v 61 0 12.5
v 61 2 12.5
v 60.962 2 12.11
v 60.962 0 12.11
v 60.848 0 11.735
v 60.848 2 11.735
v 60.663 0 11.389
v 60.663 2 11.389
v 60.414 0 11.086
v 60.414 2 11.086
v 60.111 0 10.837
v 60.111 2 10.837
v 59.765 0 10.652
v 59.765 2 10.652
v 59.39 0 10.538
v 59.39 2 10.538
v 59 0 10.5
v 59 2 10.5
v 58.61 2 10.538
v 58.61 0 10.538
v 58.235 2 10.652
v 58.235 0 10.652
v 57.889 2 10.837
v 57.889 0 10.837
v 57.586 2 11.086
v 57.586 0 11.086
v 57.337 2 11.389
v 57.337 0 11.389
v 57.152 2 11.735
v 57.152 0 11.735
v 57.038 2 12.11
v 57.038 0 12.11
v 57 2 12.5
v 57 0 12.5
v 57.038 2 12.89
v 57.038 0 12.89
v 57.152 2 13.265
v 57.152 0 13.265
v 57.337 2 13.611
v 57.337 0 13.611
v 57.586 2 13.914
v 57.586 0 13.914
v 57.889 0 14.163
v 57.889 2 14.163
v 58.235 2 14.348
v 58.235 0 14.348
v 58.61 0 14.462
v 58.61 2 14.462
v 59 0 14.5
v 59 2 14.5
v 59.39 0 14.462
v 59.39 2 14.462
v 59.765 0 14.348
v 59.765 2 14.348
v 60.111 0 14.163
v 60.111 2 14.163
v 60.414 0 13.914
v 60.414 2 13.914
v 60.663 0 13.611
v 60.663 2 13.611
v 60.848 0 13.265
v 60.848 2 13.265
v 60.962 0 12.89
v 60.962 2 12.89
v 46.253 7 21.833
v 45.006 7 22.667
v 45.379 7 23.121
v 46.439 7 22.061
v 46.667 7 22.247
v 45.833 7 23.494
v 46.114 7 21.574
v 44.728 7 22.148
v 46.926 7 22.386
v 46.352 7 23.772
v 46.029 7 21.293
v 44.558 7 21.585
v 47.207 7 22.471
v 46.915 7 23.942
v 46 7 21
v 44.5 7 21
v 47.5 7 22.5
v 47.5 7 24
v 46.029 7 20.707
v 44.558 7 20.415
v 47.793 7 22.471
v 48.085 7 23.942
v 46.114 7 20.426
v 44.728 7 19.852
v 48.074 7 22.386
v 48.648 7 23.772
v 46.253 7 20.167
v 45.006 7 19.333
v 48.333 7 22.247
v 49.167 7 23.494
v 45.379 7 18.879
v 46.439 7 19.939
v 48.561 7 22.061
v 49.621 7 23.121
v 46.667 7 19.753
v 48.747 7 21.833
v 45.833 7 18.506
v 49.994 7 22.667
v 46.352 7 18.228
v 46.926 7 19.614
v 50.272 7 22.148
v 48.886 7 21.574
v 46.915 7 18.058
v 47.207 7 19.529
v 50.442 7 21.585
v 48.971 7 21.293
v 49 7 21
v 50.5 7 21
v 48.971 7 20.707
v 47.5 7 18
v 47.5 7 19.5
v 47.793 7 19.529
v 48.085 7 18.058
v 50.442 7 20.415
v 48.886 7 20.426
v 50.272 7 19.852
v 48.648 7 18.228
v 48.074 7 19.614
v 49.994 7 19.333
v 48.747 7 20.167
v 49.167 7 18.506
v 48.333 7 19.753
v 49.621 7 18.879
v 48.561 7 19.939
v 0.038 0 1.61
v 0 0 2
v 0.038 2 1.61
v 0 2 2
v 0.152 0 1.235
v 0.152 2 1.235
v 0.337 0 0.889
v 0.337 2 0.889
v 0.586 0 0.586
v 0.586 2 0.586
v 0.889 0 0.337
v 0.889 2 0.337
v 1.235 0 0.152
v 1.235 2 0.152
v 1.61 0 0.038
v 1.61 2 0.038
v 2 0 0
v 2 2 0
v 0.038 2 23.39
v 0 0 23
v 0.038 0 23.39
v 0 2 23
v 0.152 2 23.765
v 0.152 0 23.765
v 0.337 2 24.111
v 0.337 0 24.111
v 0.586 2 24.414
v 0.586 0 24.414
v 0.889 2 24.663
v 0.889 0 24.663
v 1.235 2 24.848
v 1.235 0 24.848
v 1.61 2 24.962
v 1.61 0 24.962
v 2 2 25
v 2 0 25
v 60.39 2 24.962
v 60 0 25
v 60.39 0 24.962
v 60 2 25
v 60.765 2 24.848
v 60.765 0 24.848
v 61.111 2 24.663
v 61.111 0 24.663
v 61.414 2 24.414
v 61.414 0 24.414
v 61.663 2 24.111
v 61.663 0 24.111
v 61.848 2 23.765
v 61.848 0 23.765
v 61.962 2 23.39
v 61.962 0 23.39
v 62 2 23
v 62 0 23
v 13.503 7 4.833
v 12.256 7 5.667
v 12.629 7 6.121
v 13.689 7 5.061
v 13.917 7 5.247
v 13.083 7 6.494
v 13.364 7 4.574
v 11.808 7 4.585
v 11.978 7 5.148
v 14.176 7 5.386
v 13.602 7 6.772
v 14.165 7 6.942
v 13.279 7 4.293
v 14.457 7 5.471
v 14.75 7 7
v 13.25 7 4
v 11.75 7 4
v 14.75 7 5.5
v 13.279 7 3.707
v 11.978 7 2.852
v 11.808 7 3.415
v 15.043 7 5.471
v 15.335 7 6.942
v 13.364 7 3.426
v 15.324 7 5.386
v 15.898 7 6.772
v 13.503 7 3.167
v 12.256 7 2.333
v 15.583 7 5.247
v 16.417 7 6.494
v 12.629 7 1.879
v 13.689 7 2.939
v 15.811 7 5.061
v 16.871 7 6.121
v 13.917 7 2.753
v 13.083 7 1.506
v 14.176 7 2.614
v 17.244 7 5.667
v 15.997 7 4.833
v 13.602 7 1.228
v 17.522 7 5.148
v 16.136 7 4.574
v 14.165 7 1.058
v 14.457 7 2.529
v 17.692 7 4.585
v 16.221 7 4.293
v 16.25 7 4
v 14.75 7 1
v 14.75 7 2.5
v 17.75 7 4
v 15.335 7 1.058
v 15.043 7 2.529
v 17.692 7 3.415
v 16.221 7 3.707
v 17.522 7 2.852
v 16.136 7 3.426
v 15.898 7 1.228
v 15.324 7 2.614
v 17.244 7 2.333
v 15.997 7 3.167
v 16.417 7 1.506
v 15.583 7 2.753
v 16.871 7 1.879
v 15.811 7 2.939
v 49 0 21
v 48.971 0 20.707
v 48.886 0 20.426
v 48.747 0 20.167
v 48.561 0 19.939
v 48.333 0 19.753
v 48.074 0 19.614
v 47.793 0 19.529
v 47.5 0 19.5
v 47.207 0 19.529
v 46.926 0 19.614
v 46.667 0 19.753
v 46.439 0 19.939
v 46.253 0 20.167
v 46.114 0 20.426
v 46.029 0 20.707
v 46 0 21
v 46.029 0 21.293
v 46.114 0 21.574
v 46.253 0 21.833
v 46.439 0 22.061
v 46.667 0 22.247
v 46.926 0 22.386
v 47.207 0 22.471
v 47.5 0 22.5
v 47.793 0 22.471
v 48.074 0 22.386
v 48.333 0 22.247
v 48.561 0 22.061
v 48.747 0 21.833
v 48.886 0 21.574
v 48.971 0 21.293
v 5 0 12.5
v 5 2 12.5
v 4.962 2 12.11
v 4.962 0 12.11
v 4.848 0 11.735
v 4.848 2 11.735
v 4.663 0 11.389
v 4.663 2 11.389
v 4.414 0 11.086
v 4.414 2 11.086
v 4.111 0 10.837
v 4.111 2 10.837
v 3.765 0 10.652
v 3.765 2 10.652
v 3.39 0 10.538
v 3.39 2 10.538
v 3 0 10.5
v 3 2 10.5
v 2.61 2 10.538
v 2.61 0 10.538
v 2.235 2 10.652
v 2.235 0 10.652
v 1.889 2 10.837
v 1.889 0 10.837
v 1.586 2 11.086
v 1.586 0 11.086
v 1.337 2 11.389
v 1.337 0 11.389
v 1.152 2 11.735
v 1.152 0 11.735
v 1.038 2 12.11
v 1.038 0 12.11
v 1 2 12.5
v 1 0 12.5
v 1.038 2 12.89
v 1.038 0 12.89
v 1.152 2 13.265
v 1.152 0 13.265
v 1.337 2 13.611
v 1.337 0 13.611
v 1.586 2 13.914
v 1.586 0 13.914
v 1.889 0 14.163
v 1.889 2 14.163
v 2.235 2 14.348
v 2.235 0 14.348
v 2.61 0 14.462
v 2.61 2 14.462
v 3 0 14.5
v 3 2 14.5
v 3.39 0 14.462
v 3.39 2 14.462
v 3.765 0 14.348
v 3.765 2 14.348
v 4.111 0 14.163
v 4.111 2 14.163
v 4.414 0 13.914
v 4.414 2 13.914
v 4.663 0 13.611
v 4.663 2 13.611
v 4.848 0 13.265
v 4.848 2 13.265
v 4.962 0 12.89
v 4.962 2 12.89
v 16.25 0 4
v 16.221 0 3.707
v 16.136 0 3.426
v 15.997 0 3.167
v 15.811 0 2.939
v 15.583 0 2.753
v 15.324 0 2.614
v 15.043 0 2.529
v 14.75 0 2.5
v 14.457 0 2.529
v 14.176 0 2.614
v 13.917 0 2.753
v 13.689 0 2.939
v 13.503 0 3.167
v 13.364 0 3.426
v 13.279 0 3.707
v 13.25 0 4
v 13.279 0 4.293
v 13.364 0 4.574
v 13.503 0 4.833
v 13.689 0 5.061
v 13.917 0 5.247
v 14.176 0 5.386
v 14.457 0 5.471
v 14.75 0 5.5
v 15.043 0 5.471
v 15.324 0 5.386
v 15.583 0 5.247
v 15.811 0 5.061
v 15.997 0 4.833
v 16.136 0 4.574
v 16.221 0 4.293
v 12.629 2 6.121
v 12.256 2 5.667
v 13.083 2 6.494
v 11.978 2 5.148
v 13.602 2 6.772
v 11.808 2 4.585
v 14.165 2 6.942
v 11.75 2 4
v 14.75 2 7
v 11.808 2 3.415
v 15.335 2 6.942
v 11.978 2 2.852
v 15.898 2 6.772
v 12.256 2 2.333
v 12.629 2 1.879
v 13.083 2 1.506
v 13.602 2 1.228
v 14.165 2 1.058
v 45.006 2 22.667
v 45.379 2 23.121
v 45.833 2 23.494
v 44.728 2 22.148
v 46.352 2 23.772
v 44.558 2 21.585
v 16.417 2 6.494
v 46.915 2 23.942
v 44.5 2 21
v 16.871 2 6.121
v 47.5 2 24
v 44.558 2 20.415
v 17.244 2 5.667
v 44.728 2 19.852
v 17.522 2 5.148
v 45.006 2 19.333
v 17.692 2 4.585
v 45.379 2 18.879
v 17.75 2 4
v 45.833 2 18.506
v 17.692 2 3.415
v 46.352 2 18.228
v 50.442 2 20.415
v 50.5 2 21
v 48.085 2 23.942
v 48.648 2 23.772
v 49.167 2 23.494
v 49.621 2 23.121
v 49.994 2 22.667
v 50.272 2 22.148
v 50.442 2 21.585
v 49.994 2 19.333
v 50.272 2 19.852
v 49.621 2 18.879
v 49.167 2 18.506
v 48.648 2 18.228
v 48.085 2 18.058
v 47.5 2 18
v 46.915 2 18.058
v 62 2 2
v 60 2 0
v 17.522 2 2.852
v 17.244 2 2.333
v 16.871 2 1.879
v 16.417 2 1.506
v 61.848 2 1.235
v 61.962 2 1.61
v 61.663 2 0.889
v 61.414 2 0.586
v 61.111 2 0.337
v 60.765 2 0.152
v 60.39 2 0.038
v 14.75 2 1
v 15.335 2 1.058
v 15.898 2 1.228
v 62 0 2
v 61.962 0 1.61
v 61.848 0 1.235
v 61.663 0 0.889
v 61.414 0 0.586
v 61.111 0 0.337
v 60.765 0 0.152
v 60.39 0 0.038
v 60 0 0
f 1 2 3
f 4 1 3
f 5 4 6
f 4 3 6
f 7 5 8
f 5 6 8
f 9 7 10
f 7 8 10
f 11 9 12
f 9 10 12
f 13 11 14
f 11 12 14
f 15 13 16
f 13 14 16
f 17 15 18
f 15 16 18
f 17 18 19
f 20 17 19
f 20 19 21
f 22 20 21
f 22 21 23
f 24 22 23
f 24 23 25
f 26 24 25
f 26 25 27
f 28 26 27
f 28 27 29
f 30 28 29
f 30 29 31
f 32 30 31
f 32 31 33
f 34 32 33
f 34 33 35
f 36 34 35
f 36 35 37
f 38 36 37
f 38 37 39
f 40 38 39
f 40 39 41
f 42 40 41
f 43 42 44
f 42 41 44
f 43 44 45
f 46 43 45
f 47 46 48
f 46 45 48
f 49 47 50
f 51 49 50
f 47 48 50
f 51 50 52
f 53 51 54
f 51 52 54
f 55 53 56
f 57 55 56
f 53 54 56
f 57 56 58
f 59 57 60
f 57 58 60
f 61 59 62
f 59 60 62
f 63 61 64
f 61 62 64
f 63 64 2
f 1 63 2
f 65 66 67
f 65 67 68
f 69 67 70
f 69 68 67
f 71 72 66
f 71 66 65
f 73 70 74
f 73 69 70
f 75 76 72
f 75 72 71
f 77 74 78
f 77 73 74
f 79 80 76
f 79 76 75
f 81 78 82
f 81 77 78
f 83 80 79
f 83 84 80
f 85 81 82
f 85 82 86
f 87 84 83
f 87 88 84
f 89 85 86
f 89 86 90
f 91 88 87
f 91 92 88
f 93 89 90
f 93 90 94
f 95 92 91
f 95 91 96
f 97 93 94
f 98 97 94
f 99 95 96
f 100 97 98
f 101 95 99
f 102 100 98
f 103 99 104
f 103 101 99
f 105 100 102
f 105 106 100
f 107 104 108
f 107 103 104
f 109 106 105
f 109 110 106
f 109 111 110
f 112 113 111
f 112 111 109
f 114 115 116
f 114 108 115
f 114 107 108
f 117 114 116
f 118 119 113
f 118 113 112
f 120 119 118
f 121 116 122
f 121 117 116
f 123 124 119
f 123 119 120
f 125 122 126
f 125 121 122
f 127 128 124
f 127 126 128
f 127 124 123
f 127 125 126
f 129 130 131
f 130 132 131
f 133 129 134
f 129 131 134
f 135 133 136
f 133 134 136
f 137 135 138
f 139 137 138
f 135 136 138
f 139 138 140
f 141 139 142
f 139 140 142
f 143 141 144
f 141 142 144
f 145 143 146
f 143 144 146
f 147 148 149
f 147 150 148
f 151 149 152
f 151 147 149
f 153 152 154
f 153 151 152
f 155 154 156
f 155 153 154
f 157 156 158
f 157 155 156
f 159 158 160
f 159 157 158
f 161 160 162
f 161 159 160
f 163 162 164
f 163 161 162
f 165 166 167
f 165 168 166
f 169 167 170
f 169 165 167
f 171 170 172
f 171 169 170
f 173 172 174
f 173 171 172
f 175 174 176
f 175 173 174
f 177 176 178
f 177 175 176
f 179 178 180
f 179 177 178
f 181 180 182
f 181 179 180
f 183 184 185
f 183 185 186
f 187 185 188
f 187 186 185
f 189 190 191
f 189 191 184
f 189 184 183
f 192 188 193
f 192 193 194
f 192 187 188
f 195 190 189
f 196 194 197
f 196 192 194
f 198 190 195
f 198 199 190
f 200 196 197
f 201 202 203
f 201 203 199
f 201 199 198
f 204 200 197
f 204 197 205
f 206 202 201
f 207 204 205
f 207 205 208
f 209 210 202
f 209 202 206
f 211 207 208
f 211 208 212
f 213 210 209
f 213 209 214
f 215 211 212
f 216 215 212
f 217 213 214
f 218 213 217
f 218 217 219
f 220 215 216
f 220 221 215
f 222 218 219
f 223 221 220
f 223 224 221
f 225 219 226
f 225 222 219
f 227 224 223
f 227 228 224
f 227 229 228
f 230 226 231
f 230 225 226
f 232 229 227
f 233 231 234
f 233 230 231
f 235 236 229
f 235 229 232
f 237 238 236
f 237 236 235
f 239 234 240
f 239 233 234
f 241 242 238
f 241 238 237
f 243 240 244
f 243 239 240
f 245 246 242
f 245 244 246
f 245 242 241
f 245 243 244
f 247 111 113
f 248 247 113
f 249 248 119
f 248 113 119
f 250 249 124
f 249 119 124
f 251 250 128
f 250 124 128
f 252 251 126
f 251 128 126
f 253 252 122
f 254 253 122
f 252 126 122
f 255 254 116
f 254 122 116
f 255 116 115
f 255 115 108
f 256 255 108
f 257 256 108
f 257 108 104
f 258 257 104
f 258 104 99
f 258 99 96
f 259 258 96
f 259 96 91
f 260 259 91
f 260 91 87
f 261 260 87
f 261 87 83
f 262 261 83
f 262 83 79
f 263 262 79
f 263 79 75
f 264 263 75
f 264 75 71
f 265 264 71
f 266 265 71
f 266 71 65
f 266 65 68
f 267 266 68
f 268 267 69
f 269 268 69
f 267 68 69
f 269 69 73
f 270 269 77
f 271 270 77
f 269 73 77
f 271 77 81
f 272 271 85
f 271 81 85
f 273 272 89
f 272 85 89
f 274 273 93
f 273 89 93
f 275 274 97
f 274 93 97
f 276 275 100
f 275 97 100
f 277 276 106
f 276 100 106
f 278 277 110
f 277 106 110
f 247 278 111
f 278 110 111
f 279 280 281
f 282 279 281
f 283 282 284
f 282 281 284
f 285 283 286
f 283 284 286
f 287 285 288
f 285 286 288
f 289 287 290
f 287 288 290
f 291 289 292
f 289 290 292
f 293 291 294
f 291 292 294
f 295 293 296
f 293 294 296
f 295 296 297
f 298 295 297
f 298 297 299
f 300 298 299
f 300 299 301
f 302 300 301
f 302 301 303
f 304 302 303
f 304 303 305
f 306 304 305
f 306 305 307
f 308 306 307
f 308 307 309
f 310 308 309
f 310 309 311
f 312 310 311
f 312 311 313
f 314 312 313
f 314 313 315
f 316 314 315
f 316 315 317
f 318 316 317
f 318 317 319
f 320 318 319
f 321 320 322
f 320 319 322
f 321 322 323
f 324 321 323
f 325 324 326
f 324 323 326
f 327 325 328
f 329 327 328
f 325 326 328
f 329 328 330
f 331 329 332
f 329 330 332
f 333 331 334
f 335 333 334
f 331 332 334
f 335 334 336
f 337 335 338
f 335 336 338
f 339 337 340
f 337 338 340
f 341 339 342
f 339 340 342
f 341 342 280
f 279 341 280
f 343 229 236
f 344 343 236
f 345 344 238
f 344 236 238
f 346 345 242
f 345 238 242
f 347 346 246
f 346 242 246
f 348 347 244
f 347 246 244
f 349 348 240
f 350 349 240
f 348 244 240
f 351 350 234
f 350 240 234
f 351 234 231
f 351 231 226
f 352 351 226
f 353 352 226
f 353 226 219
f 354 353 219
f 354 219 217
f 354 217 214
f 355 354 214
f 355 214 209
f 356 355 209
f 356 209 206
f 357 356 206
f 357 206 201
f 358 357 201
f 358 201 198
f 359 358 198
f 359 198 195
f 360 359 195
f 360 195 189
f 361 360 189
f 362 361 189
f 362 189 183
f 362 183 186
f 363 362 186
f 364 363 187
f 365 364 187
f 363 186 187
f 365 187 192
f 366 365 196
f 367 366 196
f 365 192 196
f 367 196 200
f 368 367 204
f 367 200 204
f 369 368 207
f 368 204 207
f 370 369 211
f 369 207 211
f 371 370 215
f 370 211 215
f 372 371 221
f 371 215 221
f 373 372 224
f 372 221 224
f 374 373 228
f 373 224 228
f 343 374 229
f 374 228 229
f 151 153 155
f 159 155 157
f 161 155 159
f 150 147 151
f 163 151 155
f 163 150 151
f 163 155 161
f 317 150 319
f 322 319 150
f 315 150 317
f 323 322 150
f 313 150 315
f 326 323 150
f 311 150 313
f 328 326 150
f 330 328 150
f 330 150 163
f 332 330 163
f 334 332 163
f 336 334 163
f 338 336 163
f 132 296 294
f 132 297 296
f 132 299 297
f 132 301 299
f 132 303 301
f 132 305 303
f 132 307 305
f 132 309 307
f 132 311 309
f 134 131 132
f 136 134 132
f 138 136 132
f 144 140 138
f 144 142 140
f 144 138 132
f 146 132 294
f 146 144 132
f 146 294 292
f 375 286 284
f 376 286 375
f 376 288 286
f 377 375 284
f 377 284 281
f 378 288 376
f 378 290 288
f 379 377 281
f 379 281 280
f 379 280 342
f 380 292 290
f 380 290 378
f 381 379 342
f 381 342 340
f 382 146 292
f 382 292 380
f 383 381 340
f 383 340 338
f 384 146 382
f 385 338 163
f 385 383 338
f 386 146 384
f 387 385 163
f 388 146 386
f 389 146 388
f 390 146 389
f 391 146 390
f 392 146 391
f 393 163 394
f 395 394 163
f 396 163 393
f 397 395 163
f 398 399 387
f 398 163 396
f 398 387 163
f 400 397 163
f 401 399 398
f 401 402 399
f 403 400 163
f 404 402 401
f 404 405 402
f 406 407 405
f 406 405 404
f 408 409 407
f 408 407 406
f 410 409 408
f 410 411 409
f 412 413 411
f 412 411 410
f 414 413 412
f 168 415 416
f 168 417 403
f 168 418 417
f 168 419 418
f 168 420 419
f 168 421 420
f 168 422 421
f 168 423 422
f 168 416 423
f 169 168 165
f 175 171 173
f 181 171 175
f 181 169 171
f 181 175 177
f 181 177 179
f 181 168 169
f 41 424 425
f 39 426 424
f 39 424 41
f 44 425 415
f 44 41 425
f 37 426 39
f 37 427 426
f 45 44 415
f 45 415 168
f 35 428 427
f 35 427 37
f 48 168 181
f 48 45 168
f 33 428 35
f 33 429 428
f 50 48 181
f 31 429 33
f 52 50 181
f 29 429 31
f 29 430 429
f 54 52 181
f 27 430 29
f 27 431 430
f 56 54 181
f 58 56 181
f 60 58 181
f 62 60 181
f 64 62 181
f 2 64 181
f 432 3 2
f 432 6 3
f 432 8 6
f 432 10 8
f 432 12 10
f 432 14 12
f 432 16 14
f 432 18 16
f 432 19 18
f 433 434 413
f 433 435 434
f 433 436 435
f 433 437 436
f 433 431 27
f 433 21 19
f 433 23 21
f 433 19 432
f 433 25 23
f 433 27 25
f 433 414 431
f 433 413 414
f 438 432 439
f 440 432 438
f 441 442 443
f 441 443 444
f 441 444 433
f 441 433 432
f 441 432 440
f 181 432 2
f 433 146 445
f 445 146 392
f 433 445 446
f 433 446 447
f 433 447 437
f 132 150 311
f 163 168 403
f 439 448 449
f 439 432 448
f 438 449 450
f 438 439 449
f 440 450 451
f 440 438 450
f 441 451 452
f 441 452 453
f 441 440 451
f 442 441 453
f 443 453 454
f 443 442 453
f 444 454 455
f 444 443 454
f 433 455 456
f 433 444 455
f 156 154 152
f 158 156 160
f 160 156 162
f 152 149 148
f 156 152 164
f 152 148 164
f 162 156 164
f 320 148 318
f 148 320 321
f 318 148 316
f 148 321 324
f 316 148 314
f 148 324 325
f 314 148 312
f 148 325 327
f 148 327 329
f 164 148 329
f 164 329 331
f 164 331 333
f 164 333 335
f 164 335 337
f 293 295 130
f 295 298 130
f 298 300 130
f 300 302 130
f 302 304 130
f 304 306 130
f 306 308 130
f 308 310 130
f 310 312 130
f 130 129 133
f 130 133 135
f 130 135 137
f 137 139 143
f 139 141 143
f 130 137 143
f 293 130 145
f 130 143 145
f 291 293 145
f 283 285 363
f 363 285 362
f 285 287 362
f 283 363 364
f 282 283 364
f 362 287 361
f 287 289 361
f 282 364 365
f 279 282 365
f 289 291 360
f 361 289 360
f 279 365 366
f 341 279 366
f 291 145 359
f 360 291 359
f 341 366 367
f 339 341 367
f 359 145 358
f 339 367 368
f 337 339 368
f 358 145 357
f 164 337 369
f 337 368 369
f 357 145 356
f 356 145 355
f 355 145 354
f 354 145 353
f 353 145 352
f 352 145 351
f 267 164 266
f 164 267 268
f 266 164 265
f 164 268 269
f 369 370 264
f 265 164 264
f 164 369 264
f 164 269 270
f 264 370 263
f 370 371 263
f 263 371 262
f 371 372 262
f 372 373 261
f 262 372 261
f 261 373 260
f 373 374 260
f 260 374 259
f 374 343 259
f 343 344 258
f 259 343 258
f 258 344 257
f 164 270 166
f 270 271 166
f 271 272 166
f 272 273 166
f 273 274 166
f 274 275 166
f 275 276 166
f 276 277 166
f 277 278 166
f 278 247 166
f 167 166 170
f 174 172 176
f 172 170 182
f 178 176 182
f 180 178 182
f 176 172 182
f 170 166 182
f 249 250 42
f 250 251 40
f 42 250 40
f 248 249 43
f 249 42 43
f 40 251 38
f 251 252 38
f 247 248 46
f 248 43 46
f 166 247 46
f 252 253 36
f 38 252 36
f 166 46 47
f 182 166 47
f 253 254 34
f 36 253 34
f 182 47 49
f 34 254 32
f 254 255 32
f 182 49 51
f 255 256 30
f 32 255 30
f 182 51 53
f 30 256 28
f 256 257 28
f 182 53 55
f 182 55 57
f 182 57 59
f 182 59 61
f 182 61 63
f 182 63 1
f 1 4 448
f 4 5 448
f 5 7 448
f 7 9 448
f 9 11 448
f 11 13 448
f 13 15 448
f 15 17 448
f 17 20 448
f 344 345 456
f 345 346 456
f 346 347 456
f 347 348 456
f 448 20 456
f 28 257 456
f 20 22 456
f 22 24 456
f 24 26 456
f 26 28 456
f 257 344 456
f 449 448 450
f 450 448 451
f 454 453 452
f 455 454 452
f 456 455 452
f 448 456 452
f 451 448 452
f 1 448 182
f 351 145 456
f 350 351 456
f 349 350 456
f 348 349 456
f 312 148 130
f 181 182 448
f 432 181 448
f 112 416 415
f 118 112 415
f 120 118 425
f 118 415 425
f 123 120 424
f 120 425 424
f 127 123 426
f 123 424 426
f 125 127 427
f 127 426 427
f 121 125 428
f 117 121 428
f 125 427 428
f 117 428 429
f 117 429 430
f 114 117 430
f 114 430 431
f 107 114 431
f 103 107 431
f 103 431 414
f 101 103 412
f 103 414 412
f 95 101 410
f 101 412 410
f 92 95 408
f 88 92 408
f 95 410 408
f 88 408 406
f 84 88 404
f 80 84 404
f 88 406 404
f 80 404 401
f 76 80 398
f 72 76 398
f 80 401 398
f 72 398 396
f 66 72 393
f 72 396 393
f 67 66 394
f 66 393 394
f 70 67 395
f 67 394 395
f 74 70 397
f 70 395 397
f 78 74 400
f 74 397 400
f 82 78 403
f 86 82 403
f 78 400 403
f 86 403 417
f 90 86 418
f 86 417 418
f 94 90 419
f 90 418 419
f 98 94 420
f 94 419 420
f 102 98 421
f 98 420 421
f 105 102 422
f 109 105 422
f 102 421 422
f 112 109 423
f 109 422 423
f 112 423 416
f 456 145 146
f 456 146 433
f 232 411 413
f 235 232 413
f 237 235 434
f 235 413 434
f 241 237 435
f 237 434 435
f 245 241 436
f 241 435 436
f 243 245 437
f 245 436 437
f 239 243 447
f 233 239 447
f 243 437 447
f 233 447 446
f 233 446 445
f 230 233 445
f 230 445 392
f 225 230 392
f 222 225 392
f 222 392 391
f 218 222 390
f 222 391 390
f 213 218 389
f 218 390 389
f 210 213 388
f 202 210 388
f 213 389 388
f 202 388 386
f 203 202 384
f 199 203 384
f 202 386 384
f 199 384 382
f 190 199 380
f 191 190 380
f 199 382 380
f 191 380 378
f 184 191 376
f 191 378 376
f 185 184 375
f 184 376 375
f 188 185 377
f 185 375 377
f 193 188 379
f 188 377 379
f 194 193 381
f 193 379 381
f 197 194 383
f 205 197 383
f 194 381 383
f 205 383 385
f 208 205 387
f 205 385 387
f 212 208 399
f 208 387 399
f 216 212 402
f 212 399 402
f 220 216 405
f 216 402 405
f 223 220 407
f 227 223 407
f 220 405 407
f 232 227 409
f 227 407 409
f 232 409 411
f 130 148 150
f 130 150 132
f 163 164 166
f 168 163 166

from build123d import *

# Parameters (mm, degrees)
SKETCH_1_W               = 62
SKETCH_1_H               = 25
EXTRUDE_1_DEPTH          = 2
SKETCH_2_R               = 3
EXTRUDE_2_DEPTH          = 5
SKETCH_3_R               = 1.5
CUT_EXTRUDE_1_DEPTH      = 1
CUT_EXTRUDE_1_DEPTH_BACK = 8
SKETCH_4_R               = 2
CUT_EXTRUDE_2_DEPTH      = 6
CUT_EXTRUDE_2_DEPTH_BACK = 3
FILLET_1_R               = 2
FILLET_2_R               = 2
FILLET_3_R               = 2
FILLET_4_R               = 2


with BuildPart() as part:
    # Эскиз1 → Бобышка-Вытянуть1 (new body)
    with BuildSketch(Plane(origin=(0, 0, 0), x_dir=(1, 0, 0), z_dir=(0, 1, 0))):
        with Locations((31, -12.5)):
            Rectangle(SKETCH_1_W, SKETCH_1_H)
    extrude(amount=EXTRUDE_1_DEPTH)

    # Эскиз2 → Бобышка-Вытянуть2 (add)
    with BuildSketch(Plane(origin=(0, 2, 0), x_dir=(1, 0, 0), z_dir=(0, 1, 0))):
        with Locations((14.75, -4)):
            Circle(SKETCH_2_R)
        with Locations((47.5, -21)):
            Circle(SKETCH_2_R)
    extrude(amount=EXTRUDE_2_DEPTH)

    # Эскиз3 → Вырез-Вытянуть1 (cut, two sides)
    with BuildSketch(Plane(origin=(0, 7, 0), x_dir=(1, 0, 0), z_dir=(0, 1, 0))) as cut_extrude_1_sk:
        with Locations((14.75, -4)):
            Circle(SKETCH_3_R)
        with Locations((47.5, -21)):
            Circle(SKETCH_3_R)
    extrude(amount=CUT_EXTRUDE_1_DEPTH, mode=Mode.SUBTRACT)
    extrude(cut_extrude_1_sk.sketch, amount=-CUT_EXTRUDE_1_DEPTH_BACK, mode=Mode.SUBTRACT)

    # Эскиз4 → Вырез-Вытянуть2 (cut, two sides)
    with BuildSketch(Plane(origin=(0, 2, 0), x_dir=(1, 0, 0), z_dir=(0, 1, 0))) as cut_extrude_2_sk:
        with Locations((3, -12.5)):
            Circle(SKETCH_4_R)
        with Locations((59, -12.5)):
            Circle(SKETCH_4_R)
    extrude(amount=CUT_EXTRUDE_2_DEPTH, mode=Mode.SUBTRACT)
    extrude(cut_extrude_2_sk.sketch, amount=-CUT_EXTRUDE_2_DEPTH_BACK, mode=Mode.SUBTRACT)

    # Скругление1
    fillet_1_edges = [part.edges().sort_by_distance(p)[0] for p in [
        (0, 1, 0),
    ]]
    fillet(fillet_1_edges, radius=FILLET_1_R)

    # Скругление2
    fillet_2_edges = [part.edges().sort_by_distance(p)[0] for p in [
        (0, 1, 25),
    ]]
    fillet(fillet_2_edges, radius=FILLET_2_R)

    # Скругление3
    fillet_3_edges = [part.edges().sort_by_distance(p)[0] for p in [
        (62, 1, 25),
    ]]
    fillet(fillet_3_edges, radius=FILLET_3_R)

    # Скругление4
    fillet_4_edges = [part.edges().sort_by_distance(p)[0] for p in [
        (62, 1, 0),
    ]]
    fillet(fillet_4_edges, radius=FILLET_4_R)


solid = part.part
